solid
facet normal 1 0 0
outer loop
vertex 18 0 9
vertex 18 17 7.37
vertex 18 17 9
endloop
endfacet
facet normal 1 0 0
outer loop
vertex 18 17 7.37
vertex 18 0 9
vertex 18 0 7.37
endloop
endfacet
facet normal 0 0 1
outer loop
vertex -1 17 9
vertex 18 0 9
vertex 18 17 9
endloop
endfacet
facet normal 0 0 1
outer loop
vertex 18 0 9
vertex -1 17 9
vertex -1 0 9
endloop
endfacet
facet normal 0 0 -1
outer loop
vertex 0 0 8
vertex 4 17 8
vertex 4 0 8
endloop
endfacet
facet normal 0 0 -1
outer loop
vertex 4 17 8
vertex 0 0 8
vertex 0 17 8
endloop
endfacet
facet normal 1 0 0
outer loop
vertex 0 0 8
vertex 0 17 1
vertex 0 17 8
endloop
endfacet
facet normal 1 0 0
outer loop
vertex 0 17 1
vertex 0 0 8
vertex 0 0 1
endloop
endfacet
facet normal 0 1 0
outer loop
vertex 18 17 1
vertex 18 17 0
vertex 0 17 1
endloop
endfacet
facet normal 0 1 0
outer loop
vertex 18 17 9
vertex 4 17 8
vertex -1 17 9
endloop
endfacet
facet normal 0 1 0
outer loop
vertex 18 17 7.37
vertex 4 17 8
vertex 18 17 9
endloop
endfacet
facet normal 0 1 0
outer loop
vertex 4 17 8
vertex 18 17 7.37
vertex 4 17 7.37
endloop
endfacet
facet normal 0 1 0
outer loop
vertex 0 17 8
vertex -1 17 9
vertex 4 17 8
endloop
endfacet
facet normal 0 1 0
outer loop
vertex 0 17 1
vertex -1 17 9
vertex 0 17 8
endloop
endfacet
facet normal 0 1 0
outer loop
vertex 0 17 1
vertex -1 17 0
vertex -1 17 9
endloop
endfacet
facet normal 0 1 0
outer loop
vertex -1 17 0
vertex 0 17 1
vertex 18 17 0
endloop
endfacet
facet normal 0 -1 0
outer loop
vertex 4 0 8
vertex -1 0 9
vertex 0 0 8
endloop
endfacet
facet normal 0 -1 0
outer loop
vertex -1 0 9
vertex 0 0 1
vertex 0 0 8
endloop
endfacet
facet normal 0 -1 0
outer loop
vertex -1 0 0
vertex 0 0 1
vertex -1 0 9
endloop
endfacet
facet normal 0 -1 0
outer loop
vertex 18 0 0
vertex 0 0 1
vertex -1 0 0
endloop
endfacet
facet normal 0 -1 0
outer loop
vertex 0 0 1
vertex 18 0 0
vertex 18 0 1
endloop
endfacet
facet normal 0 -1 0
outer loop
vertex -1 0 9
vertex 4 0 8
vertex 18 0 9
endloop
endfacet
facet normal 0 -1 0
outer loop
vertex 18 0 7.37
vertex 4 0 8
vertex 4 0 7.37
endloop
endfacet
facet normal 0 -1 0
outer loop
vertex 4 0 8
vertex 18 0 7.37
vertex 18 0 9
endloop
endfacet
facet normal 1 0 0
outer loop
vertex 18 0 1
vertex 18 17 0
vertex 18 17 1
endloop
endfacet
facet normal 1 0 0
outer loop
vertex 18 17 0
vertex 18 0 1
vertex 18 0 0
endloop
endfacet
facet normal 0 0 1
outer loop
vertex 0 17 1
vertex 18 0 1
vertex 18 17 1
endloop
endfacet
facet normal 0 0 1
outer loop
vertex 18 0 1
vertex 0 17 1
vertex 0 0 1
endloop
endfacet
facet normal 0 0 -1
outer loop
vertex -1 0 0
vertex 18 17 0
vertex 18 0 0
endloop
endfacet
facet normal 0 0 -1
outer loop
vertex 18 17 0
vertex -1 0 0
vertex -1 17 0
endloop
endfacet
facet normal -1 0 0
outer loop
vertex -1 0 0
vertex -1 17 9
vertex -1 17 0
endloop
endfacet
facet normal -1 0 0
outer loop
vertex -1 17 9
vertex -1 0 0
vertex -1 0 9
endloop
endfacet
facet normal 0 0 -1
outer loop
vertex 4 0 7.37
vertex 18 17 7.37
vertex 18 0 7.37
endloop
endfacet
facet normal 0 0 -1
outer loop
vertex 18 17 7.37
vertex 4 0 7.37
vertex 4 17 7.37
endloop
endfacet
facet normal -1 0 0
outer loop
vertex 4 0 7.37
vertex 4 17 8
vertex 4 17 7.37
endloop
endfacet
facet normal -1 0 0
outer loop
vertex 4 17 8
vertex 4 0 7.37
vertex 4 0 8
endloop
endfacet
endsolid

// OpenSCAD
 /*
 * Notebook camera cover generator
 * (c) 2020 David Mikulik
 * Licensed under 
 *   Creative Commons 
 *   Attribution Non Comercial Share alike license
 */
 
THIKNES=1;

FRAME_SMALL=4;
FRAME=18;
DEPTH=7;
DEPTH_FRAME=0.63;
WIDTH=17;
FRAME_IMAGE="eye.png";


cube ([FRAME,WIDTH,THIKNES]);
translate ([-THIKNES,0,0])
    cube ([THIKNES,WIDTH,DEPTH+2*THIKNES]);
translate ([0,0,DEPTH+THIKNES])
    difference () 
    {
        cube ([FRAME,WIDTH,THIKNES]);
        translate ([FRAME,0,2.5])
        rotate([0,0,90])
            scale([.09,.09,.02])
                        surface(file=FRAME_IMAGE,invert=true);
    }
translate ([FRAME_SMALL,0,DEPTH+THIKNES-DEPTH_FRAME])
    cube ([FRAME-FRAME_SMALL,WIDTH,DEPTH_FRAME]);
